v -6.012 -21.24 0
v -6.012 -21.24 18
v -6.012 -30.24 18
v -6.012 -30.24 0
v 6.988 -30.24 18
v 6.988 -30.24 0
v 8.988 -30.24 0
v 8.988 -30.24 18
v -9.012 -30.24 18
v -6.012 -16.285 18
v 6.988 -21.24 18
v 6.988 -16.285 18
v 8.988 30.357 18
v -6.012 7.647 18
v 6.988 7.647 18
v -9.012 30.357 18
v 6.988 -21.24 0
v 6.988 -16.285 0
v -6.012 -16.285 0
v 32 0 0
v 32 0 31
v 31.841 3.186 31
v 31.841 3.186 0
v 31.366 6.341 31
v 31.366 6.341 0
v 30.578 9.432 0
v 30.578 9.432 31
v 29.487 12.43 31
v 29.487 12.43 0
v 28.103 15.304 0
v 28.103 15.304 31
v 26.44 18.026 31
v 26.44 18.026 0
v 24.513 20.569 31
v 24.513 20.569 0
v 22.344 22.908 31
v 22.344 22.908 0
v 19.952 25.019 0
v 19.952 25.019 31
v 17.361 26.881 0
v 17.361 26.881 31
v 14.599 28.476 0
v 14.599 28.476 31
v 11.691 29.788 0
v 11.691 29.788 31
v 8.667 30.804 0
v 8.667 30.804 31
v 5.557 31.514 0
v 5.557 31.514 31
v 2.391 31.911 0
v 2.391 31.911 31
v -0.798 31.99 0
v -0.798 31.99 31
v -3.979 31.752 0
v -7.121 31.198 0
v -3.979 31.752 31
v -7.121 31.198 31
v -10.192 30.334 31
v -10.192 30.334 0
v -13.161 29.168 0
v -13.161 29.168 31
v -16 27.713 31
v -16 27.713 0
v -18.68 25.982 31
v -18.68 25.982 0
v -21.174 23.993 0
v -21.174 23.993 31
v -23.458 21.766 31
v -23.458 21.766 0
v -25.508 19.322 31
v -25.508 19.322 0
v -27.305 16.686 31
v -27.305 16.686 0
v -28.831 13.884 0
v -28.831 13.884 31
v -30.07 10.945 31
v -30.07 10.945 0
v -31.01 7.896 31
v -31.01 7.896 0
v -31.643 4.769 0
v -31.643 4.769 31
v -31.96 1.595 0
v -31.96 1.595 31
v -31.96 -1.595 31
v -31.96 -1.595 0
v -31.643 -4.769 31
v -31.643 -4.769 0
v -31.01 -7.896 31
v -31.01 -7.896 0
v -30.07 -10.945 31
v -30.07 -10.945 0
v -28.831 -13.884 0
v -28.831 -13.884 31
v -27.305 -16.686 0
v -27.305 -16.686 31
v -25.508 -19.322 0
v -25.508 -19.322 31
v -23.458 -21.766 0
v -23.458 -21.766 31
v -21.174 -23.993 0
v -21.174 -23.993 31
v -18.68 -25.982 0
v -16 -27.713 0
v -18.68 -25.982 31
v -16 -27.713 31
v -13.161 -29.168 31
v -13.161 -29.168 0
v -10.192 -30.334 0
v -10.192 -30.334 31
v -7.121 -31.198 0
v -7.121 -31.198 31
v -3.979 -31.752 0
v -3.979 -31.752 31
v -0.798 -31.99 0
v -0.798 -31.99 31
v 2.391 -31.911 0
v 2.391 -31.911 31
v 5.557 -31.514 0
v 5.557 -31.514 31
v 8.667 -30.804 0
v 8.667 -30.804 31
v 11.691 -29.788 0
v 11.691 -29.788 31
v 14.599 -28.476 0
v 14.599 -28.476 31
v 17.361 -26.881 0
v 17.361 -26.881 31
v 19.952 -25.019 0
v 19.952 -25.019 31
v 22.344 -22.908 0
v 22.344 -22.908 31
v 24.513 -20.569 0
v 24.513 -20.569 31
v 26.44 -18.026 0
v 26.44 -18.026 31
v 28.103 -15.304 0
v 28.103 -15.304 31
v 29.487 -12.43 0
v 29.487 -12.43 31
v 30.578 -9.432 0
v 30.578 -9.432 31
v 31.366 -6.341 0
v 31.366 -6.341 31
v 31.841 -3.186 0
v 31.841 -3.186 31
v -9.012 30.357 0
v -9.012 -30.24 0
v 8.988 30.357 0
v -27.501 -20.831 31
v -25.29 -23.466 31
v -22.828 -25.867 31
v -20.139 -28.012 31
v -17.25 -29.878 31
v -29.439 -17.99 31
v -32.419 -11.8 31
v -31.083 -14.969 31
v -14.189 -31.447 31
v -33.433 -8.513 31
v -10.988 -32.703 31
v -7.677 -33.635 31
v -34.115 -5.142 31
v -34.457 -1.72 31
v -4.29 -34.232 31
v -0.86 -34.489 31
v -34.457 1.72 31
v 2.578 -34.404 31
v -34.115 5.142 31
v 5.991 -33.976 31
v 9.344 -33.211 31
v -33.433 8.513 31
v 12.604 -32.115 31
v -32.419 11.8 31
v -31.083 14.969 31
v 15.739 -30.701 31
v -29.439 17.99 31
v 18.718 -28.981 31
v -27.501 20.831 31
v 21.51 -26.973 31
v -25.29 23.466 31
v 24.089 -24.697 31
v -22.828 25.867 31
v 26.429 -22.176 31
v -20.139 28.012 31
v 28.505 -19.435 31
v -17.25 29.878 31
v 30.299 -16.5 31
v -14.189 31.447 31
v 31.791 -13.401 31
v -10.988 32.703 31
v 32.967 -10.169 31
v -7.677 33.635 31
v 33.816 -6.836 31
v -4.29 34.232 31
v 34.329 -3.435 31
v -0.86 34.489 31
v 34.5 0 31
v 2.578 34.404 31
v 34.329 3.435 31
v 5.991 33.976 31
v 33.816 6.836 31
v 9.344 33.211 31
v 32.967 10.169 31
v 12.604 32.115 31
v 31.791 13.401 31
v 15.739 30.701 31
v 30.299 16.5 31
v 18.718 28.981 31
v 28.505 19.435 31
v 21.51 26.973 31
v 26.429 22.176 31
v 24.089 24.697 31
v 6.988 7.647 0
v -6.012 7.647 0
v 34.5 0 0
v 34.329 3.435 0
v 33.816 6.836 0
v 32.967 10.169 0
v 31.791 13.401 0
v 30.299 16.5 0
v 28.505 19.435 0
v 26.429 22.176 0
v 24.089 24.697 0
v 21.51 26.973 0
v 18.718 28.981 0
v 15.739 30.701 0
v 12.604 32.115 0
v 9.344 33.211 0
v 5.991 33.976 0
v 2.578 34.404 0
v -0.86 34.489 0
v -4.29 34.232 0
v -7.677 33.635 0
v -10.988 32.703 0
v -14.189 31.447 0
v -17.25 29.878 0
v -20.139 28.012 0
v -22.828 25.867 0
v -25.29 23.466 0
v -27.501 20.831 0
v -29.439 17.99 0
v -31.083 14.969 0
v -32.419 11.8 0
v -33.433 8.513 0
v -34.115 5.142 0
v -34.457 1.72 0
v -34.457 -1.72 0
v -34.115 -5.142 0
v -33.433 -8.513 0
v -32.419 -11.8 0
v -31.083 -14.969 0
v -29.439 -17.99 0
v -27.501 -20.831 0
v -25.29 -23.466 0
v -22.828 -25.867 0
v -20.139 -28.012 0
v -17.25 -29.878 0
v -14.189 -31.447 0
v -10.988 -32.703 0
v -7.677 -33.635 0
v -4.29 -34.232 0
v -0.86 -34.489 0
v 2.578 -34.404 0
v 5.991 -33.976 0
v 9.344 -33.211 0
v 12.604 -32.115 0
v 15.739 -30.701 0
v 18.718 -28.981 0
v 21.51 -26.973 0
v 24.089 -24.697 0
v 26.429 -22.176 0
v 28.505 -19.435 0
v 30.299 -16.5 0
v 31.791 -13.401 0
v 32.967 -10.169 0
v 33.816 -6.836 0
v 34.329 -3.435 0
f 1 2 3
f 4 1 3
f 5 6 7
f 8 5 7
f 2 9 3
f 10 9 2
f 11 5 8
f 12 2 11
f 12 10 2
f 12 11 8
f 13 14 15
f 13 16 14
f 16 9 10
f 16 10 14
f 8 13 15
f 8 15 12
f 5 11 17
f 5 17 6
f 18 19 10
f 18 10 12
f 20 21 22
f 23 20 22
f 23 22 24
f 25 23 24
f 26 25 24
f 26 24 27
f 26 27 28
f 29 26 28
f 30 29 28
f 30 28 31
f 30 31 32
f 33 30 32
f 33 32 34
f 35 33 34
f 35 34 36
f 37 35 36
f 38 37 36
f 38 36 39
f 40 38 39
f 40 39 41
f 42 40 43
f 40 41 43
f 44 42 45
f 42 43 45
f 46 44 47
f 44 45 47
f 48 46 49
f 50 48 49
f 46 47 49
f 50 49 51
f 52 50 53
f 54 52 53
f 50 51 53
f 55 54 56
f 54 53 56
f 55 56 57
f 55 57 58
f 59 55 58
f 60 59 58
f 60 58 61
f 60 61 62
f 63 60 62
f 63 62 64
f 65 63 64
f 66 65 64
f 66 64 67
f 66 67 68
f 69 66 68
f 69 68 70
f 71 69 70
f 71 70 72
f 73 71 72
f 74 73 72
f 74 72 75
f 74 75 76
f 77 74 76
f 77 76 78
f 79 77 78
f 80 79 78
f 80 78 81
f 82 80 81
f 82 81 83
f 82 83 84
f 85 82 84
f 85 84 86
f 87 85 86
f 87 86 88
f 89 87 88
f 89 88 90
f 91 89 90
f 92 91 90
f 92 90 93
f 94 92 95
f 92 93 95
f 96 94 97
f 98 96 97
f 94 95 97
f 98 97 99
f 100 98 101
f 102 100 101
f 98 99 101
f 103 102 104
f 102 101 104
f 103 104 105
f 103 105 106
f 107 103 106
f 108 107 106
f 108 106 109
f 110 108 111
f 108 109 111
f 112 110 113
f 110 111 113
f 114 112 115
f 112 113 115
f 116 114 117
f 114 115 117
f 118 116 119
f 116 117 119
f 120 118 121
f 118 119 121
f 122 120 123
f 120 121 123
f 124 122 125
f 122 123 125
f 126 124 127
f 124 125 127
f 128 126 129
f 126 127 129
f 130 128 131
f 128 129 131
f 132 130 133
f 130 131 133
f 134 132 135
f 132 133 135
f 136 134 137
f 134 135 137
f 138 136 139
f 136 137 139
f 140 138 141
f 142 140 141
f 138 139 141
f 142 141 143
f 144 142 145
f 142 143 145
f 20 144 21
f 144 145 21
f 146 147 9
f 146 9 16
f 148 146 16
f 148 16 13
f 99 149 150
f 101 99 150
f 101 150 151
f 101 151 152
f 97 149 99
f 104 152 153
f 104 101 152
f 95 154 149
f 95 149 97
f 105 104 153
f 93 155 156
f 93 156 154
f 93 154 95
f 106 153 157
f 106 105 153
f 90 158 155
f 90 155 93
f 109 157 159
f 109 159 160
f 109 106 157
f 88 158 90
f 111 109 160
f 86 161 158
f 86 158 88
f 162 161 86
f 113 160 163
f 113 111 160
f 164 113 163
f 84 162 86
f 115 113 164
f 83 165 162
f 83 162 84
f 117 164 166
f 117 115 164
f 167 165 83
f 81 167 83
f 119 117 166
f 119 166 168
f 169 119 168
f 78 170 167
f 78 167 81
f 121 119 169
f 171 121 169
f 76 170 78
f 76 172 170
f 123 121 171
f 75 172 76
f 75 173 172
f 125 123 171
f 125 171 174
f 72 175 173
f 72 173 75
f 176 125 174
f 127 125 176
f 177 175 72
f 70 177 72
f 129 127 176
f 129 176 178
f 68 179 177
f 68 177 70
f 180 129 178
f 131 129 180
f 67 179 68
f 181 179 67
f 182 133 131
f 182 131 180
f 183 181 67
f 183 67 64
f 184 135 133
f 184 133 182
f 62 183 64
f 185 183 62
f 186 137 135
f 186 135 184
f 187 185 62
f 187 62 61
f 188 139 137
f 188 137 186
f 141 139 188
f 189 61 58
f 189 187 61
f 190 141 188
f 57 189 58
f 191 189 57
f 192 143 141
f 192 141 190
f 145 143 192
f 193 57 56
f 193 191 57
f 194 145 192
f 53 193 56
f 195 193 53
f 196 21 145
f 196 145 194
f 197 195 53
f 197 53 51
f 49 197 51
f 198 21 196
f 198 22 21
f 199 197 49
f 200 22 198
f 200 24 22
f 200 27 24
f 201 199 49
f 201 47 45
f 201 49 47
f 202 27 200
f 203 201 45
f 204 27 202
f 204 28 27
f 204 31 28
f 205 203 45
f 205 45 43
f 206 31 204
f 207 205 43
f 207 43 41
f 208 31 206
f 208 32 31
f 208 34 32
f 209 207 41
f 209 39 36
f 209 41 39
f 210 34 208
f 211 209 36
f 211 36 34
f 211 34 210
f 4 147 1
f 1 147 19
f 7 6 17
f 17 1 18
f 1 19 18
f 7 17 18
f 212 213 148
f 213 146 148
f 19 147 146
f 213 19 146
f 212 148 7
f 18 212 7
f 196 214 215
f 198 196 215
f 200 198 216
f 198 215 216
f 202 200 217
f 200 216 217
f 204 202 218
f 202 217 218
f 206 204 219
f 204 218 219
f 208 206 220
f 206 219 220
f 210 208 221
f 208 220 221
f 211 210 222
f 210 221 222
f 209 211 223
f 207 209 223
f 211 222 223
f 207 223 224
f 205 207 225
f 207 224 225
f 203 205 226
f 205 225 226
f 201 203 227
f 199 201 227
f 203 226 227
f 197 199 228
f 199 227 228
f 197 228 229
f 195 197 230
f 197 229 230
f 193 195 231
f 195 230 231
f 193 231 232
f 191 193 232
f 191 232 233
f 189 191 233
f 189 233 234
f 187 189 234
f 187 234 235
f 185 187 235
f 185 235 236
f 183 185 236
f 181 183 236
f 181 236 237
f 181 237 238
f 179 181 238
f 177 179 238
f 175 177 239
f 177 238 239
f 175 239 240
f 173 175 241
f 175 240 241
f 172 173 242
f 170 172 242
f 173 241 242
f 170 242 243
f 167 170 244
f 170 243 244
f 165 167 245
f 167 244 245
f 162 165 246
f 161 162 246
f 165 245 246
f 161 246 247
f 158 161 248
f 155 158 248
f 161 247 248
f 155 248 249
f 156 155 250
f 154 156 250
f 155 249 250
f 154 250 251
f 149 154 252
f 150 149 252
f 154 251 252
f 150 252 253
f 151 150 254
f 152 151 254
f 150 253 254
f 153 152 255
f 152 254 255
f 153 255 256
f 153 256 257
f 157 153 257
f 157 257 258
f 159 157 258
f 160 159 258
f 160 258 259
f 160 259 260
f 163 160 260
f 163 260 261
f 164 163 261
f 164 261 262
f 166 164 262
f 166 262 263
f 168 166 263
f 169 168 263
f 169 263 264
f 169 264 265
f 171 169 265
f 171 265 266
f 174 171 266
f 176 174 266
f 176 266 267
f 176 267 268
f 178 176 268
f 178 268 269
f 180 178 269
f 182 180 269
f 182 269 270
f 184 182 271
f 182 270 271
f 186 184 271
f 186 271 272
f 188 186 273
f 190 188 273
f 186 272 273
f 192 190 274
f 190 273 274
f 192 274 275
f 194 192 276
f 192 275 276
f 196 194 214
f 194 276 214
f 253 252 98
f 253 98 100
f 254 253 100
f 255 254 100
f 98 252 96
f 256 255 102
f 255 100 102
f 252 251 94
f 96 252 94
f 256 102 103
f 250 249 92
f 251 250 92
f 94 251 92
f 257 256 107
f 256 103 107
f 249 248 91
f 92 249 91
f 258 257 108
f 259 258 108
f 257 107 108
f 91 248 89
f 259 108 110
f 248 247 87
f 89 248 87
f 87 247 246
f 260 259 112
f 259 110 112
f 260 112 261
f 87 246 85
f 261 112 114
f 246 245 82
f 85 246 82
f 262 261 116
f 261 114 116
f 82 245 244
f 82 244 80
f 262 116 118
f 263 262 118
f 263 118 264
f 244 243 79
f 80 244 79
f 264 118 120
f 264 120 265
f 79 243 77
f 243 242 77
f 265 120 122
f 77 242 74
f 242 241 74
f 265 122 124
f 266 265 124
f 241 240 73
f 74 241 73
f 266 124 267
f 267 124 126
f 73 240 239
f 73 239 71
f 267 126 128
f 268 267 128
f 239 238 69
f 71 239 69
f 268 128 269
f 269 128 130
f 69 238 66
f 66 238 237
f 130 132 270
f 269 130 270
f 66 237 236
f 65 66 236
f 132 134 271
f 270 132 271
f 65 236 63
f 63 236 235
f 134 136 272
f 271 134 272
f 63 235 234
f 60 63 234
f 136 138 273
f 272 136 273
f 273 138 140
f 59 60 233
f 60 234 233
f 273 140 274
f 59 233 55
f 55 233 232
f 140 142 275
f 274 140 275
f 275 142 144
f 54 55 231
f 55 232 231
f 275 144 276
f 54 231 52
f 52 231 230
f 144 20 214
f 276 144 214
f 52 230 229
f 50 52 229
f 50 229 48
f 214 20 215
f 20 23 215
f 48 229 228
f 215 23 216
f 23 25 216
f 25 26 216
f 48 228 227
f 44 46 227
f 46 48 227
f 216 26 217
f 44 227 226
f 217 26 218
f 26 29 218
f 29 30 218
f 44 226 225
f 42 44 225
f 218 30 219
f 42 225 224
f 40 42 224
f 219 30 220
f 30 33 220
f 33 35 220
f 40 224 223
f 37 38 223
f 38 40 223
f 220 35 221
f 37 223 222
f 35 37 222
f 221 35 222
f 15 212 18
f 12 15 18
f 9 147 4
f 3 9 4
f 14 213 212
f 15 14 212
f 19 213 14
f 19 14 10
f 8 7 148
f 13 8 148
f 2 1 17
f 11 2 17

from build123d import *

# Parameters (mm, degrees)
F0_R     = 34.5
F1_DEPTH = 31
F2_R     = 32
F3_DEPTH = 32
F4_W     = 18
F4_H     = 60.597103
F5_DEPTH = 18
F6_W     = 13
F6_H     = 9
F7_DEPTH = 25
F8_W     = 13
F8_H     = 23.931491
F9_DEPTH = 25


with BuildPart() as f1:
    # F0 (on Top) → F1 (new body)
    with BuildSketch(Plane.XY):
        Circle(F0_R)
    extrude(amount=F1_DEPTH)

    # F2 (on face) → F3 (cut)
    with BuildSketch(Plane.XY.offset(31)):
        Circle(F2_R)
    extrude(amount=-F3_DEPTH, mode=Mode.SUBTRACT)


with BuildPart() as f5:
    # F4 (on Top) → F5 (new body)
    with BuildSketch(Plane.XY):
        with Locations((-0.012131, 0.058142)):
            Rectangle(F4_W, F4_H)
    extrude(amount=F5_DEPTH)

    # F6 (on face) → F7 (cut)
    with BuildSketch(Plane(origin=(0, 0, 0), x_dir=(1, 0, 0), z_dir=(0, 0, -1))):
        with Locations((0.487869, 25.74041)):
            Rectangle(F6_W, F6_H)
    extrude(amount=-F7_DEPTH, mode=Mode.SUBTRACT)

    # F8 (on face) → F9 (cut)
    with BuildSketch(Plane(origin=(0, 0, 0), x_dir=(1, 0, 0), z_dir=(0, 0, -1))):
        with Locations((0.487869, 4.318765)):
            Rectangle(F8_W, F8_H)
    extrude(amount=-F9_DEPTH, mode=Mode.SUBTRACT)


solid = Compound([f1.part, f5.part])
